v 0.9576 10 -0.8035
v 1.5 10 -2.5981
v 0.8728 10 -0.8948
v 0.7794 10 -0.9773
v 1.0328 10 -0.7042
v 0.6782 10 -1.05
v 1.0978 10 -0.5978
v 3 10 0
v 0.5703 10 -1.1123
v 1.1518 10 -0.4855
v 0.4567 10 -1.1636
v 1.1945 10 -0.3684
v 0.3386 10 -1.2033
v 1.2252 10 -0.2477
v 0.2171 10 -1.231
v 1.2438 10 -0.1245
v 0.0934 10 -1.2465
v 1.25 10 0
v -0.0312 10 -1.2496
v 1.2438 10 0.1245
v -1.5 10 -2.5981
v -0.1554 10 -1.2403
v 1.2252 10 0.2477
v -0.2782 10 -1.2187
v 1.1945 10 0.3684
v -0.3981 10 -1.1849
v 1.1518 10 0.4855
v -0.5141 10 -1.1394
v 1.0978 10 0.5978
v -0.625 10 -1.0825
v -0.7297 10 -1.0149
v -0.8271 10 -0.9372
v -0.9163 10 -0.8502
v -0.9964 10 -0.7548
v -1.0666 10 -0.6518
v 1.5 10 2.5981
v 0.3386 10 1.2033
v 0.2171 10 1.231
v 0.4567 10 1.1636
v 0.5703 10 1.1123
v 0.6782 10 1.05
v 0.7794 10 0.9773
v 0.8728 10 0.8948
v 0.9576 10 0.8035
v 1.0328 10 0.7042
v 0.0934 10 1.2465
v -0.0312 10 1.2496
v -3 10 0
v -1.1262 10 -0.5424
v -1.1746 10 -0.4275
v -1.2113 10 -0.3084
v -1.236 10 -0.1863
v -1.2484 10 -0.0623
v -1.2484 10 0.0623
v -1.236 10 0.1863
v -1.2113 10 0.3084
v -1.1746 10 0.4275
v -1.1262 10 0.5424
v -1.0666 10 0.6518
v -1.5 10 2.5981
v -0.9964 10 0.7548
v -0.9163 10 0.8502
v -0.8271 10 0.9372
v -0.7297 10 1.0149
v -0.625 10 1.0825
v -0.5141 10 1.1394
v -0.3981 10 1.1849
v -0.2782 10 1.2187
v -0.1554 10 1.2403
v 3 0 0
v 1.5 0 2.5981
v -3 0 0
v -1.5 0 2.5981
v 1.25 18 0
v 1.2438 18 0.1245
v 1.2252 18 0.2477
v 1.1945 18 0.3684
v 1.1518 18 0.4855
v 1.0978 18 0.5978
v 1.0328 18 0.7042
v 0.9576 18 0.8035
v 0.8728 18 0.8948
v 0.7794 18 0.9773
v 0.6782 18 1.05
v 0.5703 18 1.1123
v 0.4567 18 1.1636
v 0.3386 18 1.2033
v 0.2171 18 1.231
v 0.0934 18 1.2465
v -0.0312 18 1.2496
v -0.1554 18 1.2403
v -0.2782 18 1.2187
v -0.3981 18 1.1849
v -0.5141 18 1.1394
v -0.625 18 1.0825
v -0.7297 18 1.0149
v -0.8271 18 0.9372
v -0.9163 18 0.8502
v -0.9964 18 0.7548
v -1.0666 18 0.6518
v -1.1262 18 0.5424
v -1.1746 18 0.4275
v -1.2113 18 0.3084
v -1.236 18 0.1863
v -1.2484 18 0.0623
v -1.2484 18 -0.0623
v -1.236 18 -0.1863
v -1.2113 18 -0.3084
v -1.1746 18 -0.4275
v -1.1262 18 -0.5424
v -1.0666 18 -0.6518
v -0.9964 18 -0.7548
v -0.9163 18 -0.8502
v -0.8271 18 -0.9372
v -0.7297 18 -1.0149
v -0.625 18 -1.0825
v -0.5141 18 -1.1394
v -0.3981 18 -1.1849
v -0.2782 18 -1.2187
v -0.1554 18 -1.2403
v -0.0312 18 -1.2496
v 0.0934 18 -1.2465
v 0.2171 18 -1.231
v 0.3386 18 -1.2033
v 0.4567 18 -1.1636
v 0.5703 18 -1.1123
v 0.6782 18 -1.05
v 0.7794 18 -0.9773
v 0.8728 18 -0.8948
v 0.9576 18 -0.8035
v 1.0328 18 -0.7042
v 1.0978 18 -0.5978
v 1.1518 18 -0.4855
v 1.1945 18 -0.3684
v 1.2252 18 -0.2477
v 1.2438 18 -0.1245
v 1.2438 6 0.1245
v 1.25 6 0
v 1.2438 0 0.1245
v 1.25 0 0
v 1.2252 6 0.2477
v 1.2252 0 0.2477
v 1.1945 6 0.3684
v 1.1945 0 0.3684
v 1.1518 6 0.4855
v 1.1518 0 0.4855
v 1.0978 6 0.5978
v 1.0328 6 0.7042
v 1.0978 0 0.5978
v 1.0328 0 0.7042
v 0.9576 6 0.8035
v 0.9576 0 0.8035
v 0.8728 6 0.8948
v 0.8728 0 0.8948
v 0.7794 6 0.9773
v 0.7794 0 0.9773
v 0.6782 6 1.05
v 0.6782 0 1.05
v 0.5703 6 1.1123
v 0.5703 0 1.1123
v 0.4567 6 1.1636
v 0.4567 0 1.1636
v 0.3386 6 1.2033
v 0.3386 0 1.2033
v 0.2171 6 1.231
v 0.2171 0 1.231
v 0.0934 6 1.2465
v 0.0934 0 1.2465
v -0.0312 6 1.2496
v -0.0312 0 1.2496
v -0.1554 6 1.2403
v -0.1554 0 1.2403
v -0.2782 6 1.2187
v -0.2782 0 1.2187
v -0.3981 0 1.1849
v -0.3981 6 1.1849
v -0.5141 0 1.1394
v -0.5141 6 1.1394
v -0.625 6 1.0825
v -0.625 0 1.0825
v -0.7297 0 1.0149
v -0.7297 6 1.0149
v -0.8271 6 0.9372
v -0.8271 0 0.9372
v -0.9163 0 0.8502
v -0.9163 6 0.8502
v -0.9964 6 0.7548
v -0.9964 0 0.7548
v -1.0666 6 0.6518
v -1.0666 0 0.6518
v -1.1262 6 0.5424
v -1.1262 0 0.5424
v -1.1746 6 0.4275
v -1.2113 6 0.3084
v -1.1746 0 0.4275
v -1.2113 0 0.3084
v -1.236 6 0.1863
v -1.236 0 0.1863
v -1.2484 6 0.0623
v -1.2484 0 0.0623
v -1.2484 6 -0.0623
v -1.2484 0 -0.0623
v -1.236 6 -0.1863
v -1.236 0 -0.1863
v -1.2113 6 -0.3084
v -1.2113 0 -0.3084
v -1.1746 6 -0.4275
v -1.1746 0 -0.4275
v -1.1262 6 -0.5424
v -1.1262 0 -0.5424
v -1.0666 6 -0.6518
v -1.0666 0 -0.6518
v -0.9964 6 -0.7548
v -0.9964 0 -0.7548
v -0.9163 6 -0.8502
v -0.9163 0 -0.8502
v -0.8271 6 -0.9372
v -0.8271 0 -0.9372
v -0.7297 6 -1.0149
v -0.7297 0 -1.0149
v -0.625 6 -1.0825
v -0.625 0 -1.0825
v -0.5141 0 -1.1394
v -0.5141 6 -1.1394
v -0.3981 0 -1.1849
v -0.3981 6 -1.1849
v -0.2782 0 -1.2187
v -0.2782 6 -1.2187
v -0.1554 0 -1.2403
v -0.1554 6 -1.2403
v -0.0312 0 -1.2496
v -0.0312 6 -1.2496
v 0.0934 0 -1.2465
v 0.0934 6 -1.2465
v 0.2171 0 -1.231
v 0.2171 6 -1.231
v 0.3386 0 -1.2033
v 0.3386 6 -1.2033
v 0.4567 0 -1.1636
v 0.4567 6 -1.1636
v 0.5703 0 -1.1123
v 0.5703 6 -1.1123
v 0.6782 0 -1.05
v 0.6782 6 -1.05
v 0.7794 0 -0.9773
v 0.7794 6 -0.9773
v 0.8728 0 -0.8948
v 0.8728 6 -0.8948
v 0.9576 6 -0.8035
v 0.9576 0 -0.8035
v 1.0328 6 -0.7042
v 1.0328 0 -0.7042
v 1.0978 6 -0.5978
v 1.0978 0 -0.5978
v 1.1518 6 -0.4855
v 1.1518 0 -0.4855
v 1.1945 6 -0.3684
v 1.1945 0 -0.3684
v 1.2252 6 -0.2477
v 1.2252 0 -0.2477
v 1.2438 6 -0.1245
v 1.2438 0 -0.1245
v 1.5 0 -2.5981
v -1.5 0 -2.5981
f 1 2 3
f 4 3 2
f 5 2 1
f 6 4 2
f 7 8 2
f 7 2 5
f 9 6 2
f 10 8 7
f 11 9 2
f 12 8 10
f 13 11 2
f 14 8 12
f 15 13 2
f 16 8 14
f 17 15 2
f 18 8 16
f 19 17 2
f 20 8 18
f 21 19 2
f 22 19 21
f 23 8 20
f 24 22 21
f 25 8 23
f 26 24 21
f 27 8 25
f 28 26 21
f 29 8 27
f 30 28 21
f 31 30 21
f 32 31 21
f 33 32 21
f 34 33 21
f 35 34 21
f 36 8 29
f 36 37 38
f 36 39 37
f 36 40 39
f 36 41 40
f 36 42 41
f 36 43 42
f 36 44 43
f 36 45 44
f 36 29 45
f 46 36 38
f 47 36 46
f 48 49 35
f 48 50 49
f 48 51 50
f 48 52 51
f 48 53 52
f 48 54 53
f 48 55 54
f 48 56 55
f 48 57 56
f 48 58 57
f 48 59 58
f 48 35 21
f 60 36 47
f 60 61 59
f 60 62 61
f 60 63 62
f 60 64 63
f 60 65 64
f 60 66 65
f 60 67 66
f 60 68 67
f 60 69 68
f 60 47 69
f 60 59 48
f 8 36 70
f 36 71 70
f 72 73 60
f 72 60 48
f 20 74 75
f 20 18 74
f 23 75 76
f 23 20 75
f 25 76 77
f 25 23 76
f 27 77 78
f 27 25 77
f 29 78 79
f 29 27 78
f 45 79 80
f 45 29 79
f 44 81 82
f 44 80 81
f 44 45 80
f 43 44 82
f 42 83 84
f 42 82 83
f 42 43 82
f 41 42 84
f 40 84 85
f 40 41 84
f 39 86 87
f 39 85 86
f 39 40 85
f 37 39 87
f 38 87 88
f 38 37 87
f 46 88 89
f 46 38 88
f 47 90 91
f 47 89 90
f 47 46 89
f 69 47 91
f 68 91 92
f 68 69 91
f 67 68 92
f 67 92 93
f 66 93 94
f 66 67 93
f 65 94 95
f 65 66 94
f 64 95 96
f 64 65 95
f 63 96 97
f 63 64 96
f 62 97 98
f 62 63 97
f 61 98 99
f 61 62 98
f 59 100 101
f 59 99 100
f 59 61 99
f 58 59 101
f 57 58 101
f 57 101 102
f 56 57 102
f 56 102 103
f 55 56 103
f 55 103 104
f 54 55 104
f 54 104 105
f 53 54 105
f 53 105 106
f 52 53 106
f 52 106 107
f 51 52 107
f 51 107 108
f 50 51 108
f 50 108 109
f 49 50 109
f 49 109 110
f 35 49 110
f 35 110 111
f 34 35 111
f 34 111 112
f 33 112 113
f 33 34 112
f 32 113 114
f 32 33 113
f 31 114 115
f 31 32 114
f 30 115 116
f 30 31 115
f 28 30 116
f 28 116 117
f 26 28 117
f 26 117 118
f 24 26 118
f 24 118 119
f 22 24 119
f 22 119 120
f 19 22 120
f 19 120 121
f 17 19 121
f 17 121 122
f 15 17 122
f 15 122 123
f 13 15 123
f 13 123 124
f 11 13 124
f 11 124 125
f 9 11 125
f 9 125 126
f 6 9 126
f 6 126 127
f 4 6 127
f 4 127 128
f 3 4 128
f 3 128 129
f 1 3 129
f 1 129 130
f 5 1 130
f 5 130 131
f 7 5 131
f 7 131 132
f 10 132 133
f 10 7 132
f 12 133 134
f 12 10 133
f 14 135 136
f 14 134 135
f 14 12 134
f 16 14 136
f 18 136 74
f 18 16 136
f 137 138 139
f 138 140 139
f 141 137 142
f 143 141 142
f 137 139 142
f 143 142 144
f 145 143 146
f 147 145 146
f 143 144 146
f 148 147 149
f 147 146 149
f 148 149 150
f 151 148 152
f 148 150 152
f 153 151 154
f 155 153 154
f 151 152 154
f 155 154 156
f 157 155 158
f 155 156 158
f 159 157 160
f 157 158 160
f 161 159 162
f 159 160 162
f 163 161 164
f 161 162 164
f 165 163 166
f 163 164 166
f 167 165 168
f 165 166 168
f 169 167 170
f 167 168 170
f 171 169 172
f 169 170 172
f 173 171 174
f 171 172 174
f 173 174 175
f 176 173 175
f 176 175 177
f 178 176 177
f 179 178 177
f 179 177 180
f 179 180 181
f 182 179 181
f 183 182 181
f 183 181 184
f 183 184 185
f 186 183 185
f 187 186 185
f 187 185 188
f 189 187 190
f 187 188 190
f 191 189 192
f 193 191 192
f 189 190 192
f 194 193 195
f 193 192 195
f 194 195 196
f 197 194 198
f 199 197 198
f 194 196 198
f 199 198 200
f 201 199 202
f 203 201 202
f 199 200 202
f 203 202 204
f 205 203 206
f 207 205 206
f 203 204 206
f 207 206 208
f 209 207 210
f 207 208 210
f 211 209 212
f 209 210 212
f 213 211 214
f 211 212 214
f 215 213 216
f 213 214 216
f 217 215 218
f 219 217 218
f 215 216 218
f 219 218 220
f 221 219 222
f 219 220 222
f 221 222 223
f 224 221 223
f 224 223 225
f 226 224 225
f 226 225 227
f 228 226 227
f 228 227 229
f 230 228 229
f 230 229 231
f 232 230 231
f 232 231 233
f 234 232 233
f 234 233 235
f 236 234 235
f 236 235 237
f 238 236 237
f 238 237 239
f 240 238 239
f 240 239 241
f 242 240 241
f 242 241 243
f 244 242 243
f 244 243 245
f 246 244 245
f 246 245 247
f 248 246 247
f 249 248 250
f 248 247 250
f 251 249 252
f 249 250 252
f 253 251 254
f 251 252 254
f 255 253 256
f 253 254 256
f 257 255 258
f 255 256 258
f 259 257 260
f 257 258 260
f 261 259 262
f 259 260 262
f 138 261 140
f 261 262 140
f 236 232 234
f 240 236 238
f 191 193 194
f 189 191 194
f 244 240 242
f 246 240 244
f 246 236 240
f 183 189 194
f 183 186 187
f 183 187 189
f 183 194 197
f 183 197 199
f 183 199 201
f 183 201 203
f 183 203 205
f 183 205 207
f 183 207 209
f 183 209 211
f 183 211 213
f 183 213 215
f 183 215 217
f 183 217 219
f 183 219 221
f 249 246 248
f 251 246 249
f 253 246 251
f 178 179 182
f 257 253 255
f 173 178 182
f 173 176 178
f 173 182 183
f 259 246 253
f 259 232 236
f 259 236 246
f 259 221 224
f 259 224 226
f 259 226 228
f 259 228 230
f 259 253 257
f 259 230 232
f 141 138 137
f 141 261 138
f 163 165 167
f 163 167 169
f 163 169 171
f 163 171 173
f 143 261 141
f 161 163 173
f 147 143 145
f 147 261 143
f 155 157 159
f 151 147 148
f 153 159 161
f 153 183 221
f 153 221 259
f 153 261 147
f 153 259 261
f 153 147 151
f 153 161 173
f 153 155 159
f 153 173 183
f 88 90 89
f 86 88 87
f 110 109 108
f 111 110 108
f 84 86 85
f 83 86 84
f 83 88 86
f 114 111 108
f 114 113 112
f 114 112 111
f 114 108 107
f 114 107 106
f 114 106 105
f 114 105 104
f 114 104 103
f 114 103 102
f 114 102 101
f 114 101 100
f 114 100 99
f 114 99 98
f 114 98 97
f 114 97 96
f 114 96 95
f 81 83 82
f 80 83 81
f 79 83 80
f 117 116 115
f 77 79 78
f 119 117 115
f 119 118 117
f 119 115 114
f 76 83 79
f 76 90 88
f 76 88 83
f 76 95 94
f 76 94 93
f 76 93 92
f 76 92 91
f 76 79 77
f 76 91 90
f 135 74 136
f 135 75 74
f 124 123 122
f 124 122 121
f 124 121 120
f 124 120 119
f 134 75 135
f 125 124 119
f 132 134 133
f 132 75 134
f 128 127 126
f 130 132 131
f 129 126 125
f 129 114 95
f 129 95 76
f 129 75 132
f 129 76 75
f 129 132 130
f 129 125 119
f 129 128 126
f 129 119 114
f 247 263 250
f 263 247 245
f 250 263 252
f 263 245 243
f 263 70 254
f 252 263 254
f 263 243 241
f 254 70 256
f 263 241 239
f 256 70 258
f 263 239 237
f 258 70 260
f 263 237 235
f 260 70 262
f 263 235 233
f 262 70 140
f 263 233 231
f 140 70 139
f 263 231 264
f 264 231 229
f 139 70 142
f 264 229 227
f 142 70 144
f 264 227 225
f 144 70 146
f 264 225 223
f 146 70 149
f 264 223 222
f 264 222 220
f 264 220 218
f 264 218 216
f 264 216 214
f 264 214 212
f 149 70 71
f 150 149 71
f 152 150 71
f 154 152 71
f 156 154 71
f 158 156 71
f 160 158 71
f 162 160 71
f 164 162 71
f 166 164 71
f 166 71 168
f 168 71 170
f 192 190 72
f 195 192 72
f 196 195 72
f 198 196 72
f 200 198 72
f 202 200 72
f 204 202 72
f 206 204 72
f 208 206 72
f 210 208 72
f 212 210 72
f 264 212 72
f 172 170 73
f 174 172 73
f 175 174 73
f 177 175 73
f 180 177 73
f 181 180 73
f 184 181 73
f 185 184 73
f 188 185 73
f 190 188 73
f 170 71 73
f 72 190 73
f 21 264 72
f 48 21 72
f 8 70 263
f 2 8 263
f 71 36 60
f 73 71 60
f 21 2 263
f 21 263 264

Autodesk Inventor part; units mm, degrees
ref_plane "YZ Plane" through (0, 0, 0) normal (1, 0, 0) x (0, 1, 0)
ref_plane "XZ Plane" through (0, 0, 0) normal (0, 1, 0) x (-1, 0, 0)
ref_plane "XY Plane" through (0, 0, 0) normal (0, 0, 1) x (1, 0, 0)
sketch "Esboço1" plane through (0, 0, 0) normal (0, 1, 0) x (-1, 0, 0)
  line L0 (-1.5, -2.5981) -> (1.5, -2.5981)
  line L1 (-1.5, 2.5981) -> (1.5, 2.5981)
  line L2 (1.5, 2.5981) -> (3, 0)
  line L3 (1.5, -2.5981) -> (3, 0)
  line L4 (-1.5, 2.5981) -> (-3, 0)
  line L5 (-3, 0) -> (-1.5, -2.5981)
  point P0 (0, 0)
  dimension "d8" = 3
  dimension "d10" = 3
  dimension "d11" = 3
  dimension "d12" = 3
  dimension "d15" = 1.5
  dimension "d16" = 1.5
  dimension "d17" = 120
  dimension "d18" = 120
  dimension "d19" = 120
  dimension "d20" = 120
  dimension "d21" = 120
  dimension "d22" = 2.5981
extrude "Extrusão1" add sketch "Esboço1" along normal blind 10
sketch "Esboço2" plane through (0, 10, 0) normal (0, 1, 0) x (1, 0, 0)
  circle A0 centre (0, 0) radius 1.25
  dimension "d26" = 2.5
extrude "Extrusão2" add sketch "Esboço2" along normal blind 8
thread "Rosca1" size "M2.5x0.45" class "6g" standard "ANSI Metric M Profile" length 7.5
sketch "Esboço3" plane through (0, 0, 0) normal (0, -1, 0) x (1, 0, 0)
  circle A0 centre (0, 0) radius 1.25
  dimension "d33" = 2.5
extrude "Extrusão3" cut sketch "Esboço3" against normal blind 6
thread "Rosca3" size "M2.5x0.45" class "6H" standard "ANSI Metric M Profile" length 4.5
equation "\"d8\" = 2 * d16"
equation "\"d10\" = 2 * d15"
equation "\"d17\" = d18"
equation "\"d19\" = d18"
equation "\"d20\" = d18"
equation "\"d21\" = d18"
properties part number "Espacador_Placas" material "Alumínio 6061"
